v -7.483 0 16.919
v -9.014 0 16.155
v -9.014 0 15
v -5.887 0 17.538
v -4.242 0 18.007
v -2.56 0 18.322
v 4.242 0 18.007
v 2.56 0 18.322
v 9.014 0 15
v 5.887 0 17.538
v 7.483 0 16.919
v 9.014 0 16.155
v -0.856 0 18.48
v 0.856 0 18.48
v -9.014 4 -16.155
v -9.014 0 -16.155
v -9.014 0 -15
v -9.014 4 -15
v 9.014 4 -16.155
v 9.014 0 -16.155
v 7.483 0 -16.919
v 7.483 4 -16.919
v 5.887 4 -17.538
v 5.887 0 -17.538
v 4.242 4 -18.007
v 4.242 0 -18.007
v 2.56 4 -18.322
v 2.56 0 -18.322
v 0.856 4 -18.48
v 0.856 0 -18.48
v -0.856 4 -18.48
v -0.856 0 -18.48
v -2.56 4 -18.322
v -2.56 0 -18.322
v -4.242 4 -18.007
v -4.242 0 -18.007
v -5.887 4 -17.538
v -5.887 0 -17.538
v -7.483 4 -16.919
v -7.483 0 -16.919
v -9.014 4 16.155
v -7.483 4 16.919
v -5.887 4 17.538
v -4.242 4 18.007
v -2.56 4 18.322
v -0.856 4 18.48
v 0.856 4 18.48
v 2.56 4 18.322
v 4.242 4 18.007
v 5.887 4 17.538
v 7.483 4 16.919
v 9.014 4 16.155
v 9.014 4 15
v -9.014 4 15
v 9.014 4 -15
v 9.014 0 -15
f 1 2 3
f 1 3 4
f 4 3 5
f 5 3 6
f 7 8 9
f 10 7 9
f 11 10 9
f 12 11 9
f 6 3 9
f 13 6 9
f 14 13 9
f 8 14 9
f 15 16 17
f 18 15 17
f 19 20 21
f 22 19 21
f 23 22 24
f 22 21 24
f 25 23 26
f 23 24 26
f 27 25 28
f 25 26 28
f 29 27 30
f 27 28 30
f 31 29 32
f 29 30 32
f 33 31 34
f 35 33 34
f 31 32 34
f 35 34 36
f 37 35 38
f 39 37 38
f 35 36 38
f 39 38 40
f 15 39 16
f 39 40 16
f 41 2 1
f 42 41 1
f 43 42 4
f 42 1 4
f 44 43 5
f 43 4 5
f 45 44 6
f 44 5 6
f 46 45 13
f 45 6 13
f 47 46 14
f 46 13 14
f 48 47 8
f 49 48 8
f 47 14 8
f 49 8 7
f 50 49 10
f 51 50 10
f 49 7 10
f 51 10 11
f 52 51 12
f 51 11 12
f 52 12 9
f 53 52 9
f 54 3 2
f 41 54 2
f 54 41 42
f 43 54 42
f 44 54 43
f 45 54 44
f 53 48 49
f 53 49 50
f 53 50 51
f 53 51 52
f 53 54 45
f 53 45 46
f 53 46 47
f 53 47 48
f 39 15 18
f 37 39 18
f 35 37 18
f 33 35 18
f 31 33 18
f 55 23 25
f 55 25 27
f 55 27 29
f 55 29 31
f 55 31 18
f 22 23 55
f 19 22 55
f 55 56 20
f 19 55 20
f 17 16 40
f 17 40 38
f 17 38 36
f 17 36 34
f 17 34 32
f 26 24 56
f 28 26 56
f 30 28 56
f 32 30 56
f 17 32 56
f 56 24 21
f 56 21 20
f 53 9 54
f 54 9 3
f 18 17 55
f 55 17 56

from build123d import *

# Parameters (mm, degrees)
BOSS_EXTRUDE1_DEPTH = 4


with BuildPart() as part:
    # Sketch1 → Boss-Extrude1 (new body)
    with BuildSketch(Plane(origin=(0, 0, 0), x_dir=(1, 0, 0), z_dir=(0, 1, 0))):
        with BuildLine():
            ThreePointArc((9.013878189, 15), (0, 17.5), (-9.013878189, 15))
            Line((-9.013878189, 15), (9.013878189, 15))
        make_face()
        with BuildLine():
            Line((-9.013878189, 16.155494421), (-9.013878189, 15))
            ThreePointArc((-9.013878189, 15), (0, 17.5), (9.013878189, 15))
            Line((9.013878189, 15), (9.013878189, 16.155494421))
            ThreePointArc((9.013878189, 16.155494421), (0, 18.5), (-9.013878189, 16.155494421))
        make_face()
        with BuildLine():
            Line((9.013878189, -15), (-9.013878189, -15))
            ThreePointArc((-9.013878189, -15), (0, -17.5), (9.013878189, -15))
        make_face()
        with BuildLine():
            ThreePointArc((9.013878189, -15), (0, -17.5), (-9.013878189, -15))
            Line((-9.013878189, -15), (-9.013878189, -16.155494421))
            ThreePointArc((-9.013878189, -16.155494421), (0, -18.5), (9.013878189, -16.155494421))
            Line((9.013878189, -16.155494421), (9.013878189, -15))
        make_face()
    extrude(amount=BOSS_EXTRUDE1_DEPTH)


solid = part.part
